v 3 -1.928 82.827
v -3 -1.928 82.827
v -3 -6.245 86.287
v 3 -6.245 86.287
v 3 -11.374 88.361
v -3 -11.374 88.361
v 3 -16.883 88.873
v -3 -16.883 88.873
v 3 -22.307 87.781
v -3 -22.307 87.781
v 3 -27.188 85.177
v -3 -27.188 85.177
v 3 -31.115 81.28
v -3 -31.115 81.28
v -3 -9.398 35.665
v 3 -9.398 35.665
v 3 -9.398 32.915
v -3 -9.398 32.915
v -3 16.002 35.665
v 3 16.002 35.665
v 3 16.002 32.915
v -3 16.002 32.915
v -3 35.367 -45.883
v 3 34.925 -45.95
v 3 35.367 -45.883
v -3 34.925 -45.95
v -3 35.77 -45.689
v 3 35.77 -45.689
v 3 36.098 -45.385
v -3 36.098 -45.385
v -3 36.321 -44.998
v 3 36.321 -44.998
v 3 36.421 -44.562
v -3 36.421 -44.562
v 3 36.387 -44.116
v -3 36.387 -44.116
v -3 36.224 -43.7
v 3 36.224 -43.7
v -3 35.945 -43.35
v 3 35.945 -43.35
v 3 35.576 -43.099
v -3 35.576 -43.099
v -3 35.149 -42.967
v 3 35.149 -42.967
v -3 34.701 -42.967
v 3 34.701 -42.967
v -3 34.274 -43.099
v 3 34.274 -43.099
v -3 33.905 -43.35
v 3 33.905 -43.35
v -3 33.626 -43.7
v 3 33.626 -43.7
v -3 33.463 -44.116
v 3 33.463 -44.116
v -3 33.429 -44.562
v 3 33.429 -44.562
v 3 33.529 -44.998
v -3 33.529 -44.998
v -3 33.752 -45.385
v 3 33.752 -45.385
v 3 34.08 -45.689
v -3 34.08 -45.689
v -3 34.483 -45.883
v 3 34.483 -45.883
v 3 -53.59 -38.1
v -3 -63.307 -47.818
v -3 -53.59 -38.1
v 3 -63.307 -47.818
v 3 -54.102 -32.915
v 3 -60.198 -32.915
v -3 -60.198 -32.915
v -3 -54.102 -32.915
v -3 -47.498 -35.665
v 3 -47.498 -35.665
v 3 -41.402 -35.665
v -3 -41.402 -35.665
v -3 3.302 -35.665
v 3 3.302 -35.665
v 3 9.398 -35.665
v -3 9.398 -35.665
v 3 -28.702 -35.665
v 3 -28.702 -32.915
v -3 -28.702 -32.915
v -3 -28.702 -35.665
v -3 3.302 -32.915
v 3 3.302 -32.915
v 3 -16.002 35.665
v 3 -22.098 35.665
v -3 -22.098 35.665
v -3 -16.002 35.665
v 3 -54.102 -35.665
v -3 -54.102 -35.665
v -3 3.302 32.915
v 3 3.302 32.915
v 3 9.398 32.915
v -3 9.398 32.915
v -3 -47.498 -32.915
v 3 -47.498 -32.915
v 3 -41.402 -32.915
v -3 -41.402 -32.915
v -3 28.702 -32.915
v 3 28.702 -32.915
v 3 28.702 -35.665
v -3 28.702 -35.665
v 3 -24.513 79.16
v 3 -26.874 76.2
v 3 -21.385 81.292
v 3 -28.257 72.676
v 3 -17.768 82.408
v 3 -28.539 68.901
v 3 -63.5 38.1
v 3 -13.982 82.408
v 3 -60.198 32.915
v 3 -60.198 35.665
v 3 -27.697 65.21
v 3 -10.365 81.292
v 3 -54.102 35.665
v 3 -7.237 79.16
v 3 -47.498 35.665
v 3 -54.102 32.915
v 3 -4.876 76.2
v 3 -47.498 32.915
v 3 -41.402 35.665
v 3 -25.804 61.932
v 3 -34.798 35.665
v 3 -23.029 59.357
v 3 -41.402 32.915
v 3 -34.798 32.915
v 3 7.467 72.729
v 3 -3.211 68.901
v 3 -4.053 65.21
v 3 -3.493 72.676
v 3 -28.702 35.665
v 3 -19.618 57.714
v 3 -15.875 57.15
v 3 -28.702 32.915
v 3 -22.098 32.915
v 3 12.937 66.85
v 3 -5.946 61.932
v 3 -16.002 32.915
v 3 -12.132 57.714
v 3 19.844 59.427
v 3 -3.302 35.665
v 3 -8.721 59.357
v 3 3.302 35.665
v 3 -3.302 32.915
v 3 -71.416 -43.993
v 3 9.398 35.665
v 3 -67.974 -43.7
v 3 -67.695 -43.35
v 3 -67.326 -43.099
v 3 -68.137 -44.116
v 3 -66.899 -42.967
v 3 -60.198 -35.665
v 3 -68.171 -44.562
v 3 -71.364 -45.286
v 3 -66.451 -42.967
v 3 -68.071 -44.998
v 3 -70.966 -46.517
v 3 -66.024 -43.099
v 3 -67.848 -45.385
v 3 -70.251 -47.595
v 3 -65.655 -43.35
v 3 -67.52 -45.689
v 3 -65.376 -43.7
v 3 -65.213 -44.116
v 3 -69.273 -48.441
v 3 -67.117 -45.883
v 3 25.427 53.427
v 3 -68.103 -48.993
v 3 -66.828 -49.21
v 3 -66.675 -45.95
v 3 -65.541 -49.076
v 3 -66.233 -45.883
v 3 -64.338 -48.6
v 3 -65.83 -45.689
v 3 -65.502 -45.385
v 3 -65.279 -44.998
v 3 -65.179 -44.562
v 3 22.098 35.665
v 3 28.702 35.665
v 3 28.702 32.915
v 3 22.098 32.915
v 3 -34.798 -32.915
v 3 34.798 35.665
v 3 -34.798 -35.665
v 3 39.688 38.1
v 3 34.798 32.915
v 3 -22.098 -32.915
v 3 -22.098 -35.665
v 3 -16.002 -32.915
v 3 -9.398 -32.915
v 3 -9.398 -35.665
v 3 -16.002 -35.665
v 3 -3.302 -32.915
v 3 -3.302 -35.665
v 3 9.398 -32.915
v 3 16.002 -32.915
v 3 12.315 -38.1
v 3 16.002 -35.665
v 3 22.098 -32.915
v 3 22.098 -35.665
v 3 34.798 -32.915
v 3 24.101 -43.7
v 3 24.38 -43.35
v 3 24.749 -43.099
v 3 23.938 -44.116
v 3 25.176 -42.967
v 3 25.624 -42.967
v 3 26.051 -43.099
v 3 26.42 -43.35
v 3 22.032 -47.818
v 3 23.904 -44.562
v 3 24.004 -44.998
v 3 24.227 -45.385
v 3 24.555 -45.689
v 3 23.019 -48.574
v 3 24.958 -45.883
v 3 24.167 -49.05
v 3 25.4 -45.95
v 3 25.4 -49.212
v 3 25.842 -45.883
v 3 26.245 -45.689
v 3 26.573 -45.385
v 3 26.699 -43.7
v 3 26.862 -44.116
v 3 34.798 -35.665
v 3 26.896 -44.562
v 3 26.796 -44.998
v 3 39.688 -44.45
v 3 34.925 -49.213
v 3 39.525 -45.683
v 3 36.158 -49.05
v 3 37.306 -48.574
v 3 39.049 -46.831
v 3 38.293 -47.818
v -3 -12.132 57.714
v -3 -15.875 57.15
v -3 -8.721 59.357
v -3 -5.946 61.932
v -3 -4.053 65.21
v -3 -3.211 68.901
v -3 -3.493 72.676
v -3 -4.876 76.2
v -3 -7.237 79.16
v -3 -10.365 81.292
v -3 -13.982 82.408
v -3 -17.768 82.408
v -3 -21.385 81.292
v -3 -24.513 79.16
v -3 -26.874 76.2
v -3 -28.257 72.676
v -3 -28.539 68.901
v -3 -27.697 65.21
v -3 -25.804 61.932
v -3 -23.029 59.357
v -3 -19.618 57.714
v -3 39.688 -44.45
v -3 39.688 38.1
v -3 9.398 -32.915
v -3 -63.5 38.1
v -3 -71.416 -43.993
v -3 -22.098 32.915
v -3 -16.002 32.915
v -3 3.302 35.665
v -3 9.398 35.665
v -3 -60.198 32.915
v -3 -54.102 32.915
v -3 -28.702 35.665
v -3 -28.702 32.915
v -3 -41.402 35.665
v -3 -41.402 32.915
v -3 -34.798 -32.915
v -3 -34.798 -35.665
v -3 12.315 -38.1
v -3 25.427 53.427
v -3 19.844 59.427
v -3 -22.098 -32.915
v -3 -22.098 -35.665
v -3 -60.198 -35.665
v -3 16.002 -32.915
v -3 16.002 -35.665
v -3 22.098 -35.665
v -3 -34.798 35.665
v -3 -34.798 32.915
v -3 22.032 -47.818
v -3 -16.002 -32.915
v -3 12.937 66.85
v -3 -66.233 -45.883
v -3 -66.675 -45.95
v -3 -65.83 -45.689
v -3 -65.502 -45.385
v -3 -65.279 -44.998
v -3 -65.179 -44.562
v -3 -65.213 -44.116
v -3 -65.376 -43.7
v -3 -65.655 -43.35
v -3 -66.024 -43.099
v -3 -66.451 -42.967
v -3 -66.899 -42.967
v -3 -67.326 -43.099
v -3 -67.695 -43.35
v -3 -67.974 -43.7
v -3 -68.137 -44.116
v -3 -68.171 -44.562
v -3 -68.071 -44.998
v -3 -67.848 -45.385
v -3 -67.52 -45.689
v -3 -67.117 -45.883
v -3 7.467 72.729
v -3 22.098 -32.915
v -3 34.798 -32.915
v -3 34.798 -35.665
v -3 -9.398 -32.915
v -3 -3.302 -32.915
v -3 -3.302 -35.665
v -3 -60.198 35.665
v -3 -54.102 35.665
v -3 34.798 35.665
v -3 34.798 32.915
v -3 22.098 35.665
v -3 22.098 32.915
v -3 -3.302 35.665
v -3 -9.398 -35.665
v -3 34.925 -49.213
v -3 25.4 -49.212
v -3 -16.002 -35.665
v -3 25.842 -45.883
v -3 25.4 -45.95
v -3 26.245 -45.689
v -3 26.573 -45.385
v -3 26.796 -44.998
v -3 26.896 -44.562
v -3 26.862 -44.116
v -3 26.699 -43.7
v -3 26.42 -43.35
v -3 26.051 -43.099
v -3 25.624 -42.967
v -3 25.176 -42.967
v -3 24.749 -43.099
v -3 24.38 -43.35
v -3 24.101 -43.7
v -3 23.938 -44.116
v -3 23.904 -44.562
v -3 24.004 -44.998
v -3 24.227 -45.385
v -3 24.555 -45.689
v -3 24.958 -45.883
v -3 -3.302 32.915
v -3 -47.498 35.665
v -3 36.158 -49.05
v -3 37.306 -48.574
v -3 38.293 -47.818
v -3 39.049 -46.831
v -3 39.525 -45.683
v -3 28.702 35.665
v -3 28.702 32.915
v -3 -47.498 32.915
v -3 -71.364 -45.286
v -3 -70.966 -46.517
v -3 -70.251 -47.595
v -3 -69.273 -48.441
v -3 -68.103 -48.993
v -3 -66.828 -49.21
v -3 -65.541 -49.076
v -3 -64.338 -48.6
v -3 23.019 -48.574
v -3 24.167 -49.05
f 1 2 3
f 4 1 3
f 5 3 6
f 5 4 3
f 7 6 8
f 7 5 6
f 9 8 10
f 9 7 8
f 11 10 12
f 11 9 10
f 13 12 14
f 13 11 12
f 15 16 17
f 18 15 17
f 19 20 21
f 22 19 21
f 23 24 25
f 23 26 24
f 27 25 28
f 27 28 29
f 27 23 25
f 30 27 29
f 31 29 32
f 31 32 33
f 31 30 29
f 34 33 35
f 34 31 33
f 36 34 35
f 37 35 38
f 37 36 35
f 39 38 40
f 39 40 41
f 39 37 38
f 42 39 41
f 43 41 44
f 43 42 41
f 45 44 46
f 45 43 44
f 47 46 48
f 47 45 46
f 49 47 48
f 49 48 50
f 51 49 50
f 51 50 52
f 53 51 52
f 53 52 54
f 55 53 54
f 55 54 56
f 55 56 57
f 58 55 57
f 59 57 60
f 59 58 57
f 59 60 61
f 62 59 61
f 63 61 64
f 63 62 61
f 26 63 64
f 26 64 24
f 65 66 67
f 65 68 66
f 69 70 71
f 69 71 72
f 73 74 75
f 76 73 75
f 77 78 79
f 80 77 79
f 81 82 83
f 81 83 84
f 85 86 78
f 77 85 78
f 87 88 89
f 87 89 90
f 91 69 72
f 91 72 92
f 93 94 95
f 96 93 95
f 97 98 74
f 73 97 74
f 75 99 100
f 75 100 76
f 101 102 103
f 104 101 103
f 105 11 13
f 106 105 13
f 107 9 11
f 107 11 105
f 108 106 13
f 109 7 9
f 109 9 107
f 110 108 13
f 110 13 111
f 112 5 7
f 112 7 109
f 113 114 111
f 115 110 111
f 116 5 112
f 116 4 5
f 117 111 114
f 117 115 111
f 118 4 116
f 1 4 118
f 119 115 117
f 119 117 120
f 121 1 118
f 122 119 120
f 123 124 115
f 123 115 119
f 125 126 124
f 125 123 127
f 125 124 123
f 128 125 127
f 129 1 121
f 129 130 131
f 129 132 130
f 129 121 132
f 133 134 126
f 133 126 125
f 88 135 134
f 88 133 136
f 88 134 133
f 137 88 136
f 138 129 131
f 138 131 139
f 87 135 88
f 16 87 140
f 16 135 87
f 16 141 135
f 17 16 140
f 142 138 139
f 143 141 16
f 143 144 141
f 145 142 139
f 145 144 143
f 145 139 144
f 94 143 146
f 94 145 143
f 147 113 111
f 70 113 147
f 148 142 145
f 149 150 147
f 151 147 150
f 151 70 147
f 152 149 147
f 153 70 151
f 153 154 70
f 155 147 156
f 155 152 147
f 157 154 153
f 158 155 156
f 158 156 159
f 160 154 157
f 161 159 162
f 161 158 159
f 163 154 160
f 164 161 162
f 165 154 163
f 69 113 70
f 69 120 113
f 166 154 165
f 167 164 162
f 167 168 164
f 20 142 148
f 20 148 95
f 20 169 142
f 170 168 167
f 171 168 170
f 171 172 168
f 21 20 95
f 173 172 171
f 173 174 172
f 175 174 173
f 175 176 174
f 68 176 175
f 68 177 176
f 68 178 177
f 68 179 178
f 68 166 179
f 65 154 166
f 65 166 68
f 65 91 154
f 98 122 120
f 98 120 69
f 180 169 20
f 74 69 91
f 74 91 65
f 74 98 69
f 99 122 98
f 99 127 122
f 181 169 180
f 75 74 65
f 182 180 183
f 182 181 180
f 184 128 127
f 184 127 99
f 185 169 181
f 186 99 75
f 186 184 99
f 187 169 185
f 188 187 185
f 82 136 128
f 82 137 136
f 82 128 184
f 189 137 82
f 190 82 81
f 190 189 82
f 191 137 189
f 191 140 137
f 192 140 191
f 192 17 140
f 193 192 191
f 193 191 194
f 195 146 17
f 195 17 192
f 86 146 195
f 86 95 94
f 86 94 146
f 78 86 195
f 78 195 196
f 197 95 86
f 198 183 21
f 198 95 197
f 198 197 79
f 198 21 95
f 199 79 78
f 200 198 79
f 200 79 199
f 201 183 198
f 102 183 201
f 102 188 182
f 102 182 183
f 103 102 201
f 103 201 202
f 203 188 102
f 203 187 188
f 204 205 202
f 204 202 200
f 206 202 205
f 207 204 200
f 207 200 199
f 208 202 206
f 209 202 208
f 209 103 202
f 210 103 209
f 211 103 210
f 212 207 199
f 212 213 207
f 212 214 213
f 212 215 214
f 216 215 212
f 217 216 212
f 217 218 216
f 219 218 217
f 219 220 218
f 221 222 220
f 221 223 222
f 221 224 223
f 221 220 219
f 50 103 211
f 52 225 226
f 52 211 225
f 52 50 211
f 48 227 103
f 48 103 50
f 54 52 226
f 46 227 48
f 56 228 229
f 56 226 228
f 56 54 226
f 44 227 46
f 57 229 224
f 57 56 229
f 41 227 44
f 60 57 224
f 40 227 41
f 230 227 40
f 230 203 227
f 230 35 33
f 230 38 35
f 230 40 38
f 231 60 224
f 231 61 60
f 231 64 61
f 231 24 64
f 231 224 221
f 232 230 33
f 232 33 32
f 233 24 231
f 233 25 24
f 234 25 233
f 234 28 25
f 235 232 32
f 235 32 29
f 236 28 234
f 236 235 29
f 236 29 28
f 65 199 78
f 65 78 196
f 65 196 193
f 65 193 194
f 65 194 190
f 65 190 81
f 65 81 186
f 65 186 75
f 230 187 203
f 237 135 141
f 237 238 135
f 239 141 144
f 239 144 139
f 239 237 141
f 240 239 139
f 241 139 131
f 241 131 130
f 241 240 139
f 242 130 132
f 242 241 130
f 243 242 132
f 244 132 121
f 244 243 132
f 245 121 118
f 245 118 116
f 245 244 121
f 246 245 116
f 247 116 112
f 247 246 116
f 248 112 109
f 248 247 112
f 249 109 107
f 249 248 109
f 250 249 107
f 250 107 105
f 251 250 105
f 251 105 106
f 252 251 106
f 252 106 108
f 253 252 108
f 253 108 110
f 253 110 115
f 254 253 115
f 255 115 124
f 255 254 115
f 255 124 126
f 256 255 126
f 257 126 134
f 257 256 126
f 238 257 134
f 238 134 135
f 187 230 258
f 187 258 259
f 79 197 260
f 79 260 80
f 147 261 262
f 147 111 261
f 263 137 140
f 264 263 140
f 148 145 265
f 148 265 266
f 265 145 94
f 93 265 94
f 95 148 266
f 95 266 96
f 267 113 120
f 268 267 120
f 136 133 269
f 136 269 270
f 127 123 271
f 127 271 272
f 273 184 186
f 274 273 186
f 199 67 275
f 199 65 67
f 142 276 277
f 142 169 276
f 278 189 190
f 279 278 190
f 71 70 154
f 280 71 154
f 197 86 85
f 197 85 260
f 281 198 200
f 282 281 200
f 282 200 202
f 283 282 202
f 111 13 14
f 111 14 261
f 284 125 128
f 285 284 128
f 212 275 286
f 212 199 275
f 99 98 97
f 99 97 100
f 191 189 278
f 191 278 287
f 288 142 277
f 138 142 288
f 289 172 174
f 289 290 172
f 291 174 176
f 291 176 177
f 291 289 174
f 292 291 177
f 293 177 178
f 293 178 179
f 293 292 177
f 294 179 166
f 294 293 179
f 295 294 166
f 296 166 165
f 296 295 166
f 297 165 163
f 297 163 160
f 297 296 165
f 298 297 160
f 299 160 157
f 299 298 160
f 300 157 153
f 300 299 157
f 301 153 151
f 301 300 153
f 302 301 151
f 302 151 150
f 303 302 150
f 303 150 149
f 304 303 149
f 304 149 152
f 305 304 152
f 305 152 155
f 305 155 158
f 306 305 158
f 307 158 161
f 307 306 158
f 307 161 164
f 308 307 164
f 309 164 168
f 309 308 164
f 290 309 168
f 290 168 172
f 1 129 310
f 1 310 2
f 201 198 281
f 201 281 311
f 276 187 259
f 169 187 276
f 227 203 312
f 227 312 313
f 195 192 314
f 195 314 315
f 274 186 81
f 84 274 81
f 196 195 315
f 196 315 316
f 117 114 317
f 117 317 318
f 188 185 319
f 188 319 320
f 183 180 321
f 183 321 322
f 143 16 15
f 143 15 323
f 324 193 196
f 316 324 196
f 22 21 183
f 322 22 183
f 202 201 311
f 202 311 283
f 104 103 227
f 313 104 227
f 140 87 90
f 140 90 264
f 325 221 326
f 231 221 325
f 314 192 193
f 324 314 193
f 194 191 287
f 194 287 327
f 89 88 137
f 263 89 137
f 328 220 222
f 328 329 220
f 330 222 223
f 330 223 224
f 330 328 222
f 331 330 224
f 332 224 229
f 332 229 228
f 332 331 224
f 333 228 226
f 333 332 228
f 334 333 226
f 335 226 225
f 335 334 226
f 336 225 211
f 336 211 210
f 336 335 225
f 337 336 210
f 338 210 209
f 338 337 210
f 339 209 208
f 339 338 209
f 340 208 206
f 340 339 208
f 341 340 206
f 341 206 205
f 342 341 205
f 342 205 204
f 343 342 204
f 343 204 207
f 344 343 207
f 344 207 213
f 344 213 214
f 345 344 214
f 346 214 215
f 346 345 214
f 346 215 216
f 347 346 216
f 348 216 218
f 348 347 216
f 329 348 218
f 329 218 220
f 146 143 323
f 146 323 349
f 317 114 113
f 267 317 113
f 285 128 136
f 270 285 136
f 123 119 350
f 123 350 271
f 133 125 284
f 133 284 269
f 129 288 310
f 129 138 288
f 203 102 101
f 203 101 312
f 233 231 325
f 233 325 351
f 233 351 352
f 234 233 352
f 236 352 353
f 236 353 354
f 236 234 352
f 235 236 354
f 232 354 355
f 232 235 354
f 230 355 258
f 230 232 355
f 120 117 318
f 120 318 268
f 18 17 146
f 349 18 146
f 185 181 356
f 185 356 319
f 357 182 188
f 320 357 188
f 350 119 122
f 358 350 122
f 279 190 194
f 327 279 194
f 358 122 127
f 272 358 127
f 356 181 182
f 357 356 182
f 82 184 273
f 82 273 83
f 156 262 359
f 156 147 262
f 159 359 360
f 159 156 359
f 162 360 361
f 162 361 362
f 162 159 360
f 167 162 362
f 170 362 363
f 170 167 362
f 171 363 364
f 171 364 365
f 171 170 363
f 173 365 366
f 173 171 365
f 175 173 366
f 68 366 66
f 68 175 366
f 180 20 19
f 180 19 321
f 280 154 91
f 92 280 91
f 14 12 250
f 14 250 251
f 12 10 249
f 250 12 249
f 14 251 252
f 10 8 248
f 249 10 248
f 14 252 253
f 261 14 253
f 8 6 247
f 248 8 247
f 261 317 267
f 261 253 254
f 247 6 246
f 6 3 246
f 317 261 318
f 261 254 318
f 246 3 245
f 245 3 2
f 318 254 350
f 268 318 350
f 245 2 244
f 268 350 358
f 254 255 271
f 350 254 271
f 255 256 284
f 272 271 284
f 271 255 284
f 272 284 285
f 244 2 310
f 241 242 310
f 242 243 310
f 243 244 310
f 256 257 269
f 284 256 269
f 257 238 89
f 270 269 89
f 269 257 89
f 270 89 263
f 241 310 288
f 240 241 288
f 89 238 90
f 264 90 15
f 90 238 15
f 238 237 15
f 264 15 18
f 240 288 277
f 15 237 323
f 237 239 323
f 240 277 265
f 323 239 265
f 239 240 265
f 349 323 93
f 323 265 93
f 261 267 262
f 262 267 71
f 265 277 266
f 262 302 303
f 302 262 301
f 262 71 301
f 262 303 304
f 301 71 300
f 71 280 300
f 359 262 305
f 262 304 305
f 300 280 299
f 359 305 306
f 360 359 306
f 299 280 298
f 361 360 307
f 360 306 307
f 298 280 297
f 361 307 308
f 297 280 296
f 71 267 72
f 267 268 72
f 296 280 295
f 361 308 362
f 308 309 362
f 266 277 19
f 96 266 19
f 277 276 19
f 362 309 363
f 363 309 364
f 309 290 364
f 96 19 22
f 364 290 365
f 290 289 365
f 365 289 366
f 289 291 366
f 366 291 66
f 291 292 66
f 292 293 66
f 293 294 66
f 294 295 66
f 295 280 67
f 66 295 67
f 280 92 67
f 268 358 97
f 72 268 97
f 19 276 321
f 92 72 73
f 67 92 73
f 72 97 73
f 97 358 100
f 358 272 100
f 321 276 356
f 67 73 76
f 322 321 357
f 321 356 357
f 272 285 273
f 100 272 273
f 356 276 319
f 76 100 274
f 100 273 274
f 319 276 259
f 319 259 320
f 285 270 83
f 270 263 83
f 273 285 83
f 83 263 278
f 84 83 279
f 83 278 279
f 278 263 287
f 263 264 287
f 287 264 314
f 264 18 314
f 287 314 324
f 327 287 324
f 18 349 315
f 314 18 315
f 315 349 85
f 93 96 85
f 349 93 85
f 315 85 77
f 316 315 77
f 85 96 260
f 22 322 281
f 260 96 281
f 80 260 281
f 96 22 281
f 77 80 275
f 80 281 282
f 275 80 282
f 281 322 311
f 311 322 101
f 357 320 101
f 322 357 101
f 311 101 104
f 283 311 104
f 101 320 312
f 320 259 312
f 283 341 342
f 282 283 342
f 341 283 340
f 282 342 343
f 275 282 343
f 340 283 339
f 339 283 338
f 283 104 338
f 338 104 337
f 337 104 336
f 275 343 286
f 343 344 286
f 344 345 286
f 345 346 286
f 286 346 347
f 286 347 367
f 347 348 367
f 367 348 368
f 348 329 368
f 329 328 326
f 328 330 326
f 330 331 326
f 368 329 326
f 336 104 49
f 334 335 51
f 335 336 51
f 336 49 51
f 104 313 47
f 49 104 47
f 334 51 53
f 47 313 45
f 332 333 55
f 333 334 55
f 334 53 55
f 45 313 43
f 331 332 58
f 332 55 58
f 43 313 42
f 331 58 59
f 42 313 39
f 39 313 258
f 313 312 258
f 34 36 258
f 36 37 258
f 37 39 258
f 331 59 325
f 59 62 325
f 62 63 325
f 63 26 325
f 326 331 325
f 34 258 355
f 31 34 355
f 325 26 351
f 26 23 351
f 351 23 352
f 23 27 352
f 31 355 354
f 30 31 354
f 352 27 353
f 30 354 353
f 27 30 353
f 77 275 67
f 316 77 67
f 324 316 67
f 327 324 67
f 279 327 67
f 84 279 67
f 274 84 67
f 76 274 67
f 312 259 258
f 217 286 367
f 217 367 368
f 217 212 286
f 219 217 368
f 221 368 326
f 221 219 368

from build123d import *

# Parameters (mm, degrees)
SKETCH4_R           = 1.5
SKETCH4_R_2         = 12.7
BOSS_EXTRUDE1_DEPTH = 3
SKETCH5_W           = 2.75
SKETCH5_H           = 6.096
LOWERSLOT_DEPTH     = 115.203880872
SKETCH5_3_W         = 2.75
SKETCH5_3_H         = 6.096
UPPERSLOT_DEPTH     = 115.203880872
LOWERSLOTS_COUNT    = 8
LOWERSLOTS_PITCH    = 12.7
UPPERSLOTS_COUNT    = 8
UPPERSLOTS_PITCH    = 12.7


with BuildPart() as part:
    # Sketch4 → Boss-Extrude1 (new, symmetric)
    with BuildSketch(Plane(origin=(0, 0, 0), x_dir=(0, 0, -1), z_dir=(1, 0, 0))):
        with BuildLine():
            ThreePointArc((47.817596045, 22.032403955), (48.849976274, 23.577470153), (49.2125, 25.4))
            Line((49.2125, 25.4), (49.2125, 34.925))
            ThreePointArc((49.2125, 34.925), (47.817596045, 38.292596045), (44.45, 39.6875))
            Line((44.45, 39.6875), (-38.1, 39.6875))
            Line((-38.1, 39.6875), (-82.826645448, -1.928345458))
            ThreePointArc((-82.826645448, -1.928345458), (-88.873309027, -16.88307423), (-81.28, -31.115))
            Line((-81.28, -31.115), (-38.1, -63.5))
            Line((-38.1, -63.5), (43.992912904, -71.415514491))
            ThreePointArc((43.992912904, -71.415514491), (48.757334408, -68.706816071), (47.817596045, -63.307403955))
            Line((47.817596045, -63.307403955), (38.1, -53.589807909))
            Line((38.1, -53.589807909), (38.1, 12.314807909))
            Line((38.1, 12.314807909), (47.817596045, 22.032403955))
        make_face()
        with Locations((44.45, -66.675)):
            Circle(SKETCH4_R, mode=Mode.SUBTRACT)
        with Locations((44.45, 25.4)):
            Circle(SKETCH4_R, mode=Mode.SUBTRACT)
        with Locations((44.45, 34.925)):
            Circle(SKETCH4_R, mode=Mode.SUBTRACT)
        with Locations((-69.85, -15.875)):
            Circle(SKETCH4_R_2, mode=Mode.SUBTRACT)
    extrude(amount=BOSS_EXTRUDE1_DEPTH, both=True)

    # Sketch5 → LowerSlot (cut, symmetric)
    with BuildSketch(Plane(origin=(3, 0, 0), x_dir=(0, 0, -1), z_dir=(1, 0, 0))):
        with Locations((34.29, -57.15)):
            Rectangle(SKETCH5_W, SKETCH5_H)
    lowerslot = extrude(amount=LOWERSLOT_DEPTH, both=True, mode=Mode.SUBTRACT)

    # Sketch5<3> → UpperSlot (cut, symmetric)
    with BuildSketch(Plane(origin=(3, 0, 0), x_dir=(0, 0, -1), z_dir=(1, 0, 0))):
        with Locations((-34.29, -57.15)):
            Rectangle(SKETCH5_3_W, SKETCH5_3_H)
    upperslot = extrude(amount=UPPERSLOT_DEPTH, both=True, mode=Mode.SUBTRACT)

    # LowerSlots: LowerSlot ×8
    with Locations(*[(0, i * LOWERSLOTS_PITCH, 0) for i in range(1, LOWERSLOTS_COUNT)]):
        add(lowerslot, mode=Mode.SUBTRACT)

    # UpperSlots: UpperSlot ×8
    with Locations(*[(0, i * UPPERSLOTS_PITCH, 0) for i in range(1, UPPERSLOTS_COUNT)]):
        add(upperslot, mode=Mode.SUBTRACT)


solid = part.part
